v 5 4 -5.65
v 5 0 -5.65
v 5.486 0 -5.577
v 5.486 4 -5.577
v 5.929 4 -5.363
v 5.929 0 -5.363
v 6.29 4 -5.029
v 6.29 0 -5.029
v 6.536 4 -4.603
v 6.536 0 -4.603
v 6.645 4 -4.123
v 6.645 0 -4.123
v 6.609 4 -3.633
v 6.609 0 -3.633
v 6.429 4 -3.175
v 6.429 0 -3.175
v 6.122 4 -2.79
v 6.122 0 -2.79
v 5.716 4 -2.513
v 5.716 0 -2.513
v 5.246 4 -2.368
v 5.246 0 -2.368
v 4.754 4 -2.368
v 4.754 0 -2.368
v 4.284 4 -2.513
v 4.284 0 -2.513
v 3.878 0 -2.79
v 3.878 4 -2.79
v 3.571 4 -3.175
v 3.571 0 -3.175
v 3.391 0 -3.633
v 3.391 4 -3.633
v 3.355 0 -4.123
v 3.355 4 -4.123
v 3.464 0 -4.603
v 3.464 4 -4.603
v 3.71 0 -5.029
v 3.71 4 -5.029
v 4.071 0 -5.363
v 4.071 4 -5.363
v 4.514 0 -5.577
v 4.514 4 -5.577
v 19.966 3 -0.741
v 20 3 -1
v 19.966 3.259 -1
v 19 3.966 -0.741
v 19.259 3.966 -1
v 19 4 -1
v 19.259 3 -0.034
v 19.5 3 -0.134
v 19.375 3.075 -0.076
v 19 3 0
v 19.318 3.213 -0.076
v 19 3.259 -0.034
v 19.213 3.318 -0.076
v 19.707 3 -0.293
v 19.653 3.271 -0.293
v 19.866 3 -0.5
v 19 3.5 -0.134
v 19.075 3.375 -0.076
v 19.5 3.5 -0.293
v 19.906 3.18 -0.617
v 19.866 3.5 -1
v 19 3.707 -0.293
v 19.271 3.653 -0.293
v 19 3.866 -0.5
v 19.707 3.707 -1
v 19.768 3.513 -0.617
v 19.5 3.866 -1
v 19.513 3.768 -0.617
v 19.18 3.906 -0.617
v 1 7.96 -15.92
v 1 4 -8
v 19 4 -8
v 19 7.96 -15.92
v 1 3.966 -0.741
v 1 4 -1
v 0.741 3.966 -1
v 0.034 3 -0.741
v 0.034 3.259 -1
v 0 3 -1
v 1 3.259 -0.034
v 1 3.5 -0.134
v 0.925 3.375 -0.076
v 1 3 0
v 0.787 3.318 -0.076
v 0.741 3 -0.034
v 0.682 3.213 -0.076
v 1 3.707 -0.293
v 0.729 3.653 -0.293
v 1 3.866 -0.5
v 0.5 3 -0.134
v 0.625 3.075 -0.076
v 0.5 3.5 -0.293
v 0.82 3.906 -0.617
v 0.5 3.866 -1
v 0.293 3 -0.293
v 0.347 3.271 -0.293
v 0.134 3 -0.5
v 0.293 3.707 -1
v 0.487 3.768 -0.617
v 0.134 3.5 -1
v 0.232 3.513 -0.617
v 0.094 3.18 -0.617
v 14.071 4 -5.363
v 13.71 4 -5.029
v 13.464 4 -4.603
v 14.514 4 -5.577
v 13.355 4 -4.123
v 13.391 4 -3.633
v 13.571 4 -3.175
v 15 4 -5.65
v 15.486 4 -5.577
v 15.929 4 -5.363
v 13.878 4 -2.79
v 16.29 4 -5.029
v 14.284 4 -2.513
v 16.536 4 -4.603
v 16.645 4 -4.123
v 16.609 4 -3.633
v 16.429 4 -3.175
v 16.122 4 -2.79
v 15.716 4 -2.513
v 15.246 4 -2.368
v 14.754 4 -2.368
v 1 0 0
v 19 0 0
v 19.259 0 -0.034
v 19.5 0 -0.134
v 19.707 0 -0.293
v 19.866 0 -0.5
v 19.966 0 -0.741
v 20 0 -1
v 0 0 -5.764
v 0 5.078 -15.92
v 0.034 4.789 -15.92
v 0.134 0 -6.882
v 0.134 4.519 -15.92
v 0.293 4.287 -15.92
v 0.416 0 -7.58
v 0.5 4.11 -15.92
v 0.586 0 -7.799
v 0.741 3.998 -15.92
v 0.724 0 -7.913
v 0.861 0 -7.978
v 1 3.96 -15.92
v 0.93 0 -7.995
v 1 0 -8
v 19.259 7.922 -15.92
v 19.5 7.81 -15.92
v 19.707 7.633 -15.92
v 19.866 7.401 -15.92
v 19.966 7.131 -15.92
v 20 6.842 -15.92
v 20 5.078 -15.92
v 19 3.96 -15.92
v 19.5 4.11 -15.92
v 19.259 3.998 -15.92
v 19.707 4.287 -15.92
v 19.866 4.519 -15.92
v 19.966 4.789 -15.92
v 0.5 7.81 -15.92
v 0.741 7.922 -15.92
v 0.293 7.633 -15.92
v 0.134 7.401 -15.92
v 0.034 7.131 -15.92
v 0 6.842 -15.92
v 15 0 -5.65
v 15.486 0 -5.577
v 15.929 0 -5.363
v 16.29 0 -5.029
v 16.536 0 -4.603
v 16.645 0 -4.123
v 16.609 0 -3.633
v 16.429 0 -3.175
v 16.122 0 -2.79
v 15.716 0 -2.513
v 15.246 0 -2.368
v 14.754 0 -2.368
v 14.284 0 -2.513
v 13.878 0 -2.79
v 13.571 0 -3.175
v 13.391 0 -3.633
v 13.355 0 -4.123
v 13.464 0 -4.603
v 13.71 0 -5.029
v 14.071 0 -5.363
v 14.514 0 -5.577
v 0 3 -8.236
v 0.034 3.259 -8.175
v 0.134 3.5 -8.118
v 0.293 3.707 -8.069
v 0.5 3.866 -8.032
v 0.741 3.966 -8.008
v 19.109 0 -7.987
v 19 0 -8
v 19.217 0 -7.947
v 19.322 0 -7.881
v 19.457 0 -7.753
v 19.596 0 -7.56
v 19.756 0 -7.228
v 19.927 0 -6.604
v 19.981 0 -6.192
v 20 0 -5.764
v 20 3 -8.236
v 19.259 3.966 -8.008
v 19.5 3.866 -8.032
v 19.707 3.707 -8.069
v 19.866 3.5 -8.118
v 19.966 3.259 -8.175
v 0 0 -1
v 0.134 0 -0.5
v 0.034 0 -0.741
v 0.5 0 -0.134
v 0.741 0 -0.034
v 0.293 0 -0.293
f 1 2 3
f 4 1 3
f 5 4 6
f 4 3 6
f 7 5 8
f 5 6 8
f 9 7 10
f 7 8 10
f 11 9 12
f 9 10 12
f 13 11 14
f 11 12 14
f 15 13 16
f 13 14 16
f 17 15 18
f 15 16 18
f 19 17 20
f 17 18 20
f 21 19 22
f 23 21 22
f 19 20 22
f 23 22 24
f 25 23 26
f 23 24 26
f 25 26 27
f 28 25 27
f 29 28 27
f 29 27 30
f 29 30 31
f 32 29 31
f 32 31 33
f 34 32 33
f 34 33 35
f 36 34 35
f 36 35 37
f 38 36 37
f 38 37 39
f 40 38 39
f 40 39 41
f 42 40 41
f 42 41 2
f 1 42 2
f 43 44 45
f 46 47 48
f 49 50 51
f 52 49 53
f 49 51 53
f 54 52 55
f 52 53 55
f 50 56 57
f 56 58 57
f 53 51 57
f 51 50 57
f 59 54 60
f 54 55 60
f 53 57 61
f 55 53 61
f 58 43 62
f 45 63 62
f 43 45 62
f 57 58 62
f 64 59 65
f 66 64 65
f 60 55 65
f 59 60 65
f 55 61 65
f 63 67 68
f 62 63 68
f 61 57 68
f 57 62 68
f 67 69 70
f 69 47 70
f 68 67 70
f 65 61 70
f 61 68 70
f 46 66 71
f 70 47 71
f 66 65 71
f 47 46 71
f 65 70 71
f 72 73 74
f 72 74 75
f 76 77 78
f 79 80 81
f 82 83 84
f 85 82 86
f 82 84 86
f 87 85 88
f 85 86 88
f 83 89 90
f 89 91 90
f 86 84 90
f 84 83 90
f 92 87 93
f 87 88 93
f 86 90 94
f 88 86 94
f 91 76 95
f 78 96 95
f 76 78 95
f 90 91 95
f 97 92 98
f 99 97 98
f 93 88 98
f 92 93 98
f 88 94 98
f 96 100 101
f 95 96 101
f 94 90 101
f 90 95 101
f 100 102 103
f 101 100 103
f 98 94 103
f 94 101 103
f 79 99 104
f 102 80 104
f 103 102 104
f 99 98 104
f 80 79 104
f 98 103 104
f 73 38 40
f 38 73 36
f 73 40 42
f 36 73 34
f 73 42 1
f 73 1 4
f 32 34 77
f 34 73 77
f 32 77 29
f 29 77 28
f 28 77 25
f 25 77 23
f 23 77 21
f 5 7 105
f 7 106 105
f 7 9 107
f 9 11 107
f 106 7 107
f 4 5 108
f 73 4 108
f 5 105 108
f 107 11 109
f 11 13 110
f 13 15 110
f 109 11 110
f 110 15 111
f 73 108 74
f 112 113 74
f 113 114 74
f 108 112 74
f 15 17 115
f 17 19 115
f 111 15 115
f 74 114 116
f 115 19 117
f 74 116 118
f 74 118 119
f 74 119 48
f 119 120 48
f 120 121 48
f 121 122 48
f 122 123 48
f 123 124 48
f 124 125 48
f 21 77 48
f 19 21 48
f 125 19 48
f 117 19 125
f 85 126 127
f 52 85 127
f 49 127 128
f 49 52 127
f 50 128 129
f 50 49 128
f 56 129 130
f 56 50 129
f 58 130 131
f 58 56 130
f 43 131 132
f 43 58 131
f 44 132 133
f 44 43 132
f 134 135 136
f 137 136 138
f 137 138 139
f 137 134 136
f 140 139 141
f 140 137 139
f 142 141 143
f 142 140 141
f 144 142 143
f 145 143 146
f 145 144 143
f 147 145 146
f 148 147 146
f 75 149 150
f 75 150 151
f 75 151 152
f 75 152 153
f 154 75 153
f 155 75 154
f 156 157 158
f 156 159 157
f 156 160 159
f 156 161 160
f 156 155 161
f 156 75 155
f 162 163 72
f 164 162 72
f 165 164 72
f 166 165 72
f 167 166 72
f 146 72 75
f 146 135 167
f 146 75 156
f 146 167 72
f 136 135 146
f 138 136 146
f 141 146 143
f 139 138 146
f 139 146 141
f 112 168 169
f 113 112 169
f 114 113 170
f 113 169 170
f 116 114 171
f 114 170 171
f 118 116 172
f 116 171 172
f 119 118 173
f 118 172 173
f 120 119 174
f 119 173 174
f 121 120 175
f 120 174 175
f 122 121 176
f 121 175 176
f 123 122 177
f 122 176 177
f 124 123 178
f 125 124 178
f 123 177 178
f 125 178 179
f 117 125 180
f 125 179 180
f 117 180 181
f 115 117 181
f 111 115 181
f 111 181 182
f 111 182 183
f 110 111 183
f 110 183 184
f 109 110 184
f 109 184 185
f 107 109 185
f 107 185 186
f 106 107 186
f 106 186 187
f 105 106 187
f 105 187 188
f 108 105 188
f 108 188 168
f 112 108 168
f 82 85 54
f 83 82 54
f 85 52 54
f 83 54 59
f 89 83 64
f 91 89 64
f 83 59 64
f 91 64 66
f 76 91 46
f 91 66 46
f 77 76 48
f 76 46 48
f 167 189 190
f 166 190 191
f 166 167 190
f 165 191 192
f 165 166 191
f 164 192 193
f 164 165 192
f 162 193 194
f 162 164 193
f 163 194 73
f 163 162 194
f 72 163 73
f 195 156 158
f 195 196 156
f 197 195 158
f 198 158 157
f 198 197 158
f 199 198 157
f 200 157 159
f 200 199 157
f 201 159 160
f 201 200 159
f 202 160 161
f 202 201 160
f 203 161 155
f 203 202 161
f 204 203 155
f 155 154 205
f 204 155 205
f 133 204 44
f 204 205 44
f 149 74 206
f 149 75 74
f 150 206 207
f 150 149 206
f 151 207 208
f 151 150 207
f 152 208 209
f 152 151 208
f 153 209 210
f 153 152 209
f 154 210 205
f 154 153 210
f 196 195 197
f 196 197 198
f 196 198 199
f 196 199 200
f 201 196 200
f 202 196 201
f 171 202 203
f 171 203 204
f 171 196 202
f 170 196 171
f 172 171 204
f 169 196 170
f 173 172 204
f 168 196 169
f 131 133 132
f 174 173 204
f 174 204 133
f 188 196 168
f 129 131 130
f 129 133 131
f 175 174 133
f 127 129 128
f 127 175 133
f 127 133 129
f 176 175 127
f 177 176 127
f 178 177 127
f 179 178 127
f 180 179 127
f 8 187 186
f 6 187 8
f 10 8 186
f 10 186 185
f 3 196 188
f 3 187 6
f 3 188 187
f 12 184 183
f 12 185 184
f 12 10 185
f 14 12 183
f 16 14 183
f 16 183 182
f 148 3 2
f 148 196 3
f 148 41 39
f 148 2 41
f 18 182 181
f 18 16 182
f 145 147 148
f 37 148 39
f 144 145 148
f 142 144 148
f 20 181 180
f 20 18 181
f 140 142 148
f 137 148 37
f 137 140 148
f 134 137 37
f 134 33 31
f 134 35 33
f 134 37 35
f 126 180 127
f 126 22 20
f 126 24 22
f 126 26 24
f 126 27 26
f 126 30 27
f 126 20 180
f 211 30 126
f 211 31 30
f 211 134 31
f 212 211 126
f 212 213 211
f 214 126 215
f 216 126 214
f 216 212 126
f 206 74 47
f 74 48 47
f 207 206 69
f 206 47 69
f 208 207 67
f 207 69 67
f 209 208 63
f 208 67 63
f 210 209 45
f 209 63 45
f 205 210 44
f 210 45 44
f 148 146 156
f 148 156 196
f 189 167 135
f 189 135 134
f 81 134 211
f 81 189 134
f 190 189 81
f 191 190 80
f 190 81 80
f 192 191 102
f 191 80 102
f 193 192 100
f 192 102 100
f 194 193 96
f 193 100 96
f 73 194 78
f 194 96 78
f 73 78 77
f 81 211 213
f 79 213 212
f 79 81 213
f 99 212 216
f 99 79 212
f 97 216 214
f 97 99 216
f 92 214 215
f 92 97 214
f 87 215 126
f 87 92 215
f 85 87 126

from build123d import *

# Parameters (mm, degrees)
RESSALTO_EXTRUS_O2_DEPTH = 20
ESBO_O6_W                = 20
ESBO_O6_H                = 8
RESSALTO_EXTRUS_O3_DEPTH = 4
ESBO_O5_R                = 1.65
CORTE_EXTRUS_O2_DEPTH    = 27.773270252
FILETE1_R                = 1


with BuildPart() as part:
    # Esboço4 → Ressalto-extrusão2 (new body)
    with BuildSketch(Plane(origin=(0, 0, 0), x_dir=(0, 0, -1), z_dir=(1, 0, 0))):
        Polygon((0, 0), (15.92, 7.96), (15.92, 3.96), (8, 0), align=None)
    extrude(amount=RESSALTO_EXTRUS_O2_DEPTH)

    # Esboço6 → Ressalto-extrusão3 (add)
    with BuildSketch(Plane.XZ):
        with Locations((10, -4)):
            Rectangle(ESBO_O6_W, ESBO_O6_H)
    extrude(amount=-RESSALTO_EXTRUS_O3_DEPTH)

    # Esboço5 → Corte-extrusão2 (cut, through all)
    with BuildSketch(Plane.XZ):
        with Locations(Location((5, -4, 0), (0, 0, 270))):
            Circle(ESBO_O5_R)
        with Locations(Location((15, -4, 0), (0, 0, 270))):
            Circle(ESBO_O5_R)
    extrude(amount=-CORTE_EXTRUS_O2_DEPTH, mode=Mode.SUBTRACT)

    # Filete1
    filete1_edges = [part.edges().sort_by_distance(p)[0] for p in [
        (20, 5.98, -11.96),
        (0, 4, -4),
        (20, 4, -4),
        (20, 2, 0),
        (10, 4, 0),
        (0, 2, 0),
        (0, 5.98, -11.96),
        (0, 1.98, -11.96),
        (20, 1.98, -11.96),
    ]]
    fillet(filete1_edges, radius=FILETE1_R)


solid = part.part
